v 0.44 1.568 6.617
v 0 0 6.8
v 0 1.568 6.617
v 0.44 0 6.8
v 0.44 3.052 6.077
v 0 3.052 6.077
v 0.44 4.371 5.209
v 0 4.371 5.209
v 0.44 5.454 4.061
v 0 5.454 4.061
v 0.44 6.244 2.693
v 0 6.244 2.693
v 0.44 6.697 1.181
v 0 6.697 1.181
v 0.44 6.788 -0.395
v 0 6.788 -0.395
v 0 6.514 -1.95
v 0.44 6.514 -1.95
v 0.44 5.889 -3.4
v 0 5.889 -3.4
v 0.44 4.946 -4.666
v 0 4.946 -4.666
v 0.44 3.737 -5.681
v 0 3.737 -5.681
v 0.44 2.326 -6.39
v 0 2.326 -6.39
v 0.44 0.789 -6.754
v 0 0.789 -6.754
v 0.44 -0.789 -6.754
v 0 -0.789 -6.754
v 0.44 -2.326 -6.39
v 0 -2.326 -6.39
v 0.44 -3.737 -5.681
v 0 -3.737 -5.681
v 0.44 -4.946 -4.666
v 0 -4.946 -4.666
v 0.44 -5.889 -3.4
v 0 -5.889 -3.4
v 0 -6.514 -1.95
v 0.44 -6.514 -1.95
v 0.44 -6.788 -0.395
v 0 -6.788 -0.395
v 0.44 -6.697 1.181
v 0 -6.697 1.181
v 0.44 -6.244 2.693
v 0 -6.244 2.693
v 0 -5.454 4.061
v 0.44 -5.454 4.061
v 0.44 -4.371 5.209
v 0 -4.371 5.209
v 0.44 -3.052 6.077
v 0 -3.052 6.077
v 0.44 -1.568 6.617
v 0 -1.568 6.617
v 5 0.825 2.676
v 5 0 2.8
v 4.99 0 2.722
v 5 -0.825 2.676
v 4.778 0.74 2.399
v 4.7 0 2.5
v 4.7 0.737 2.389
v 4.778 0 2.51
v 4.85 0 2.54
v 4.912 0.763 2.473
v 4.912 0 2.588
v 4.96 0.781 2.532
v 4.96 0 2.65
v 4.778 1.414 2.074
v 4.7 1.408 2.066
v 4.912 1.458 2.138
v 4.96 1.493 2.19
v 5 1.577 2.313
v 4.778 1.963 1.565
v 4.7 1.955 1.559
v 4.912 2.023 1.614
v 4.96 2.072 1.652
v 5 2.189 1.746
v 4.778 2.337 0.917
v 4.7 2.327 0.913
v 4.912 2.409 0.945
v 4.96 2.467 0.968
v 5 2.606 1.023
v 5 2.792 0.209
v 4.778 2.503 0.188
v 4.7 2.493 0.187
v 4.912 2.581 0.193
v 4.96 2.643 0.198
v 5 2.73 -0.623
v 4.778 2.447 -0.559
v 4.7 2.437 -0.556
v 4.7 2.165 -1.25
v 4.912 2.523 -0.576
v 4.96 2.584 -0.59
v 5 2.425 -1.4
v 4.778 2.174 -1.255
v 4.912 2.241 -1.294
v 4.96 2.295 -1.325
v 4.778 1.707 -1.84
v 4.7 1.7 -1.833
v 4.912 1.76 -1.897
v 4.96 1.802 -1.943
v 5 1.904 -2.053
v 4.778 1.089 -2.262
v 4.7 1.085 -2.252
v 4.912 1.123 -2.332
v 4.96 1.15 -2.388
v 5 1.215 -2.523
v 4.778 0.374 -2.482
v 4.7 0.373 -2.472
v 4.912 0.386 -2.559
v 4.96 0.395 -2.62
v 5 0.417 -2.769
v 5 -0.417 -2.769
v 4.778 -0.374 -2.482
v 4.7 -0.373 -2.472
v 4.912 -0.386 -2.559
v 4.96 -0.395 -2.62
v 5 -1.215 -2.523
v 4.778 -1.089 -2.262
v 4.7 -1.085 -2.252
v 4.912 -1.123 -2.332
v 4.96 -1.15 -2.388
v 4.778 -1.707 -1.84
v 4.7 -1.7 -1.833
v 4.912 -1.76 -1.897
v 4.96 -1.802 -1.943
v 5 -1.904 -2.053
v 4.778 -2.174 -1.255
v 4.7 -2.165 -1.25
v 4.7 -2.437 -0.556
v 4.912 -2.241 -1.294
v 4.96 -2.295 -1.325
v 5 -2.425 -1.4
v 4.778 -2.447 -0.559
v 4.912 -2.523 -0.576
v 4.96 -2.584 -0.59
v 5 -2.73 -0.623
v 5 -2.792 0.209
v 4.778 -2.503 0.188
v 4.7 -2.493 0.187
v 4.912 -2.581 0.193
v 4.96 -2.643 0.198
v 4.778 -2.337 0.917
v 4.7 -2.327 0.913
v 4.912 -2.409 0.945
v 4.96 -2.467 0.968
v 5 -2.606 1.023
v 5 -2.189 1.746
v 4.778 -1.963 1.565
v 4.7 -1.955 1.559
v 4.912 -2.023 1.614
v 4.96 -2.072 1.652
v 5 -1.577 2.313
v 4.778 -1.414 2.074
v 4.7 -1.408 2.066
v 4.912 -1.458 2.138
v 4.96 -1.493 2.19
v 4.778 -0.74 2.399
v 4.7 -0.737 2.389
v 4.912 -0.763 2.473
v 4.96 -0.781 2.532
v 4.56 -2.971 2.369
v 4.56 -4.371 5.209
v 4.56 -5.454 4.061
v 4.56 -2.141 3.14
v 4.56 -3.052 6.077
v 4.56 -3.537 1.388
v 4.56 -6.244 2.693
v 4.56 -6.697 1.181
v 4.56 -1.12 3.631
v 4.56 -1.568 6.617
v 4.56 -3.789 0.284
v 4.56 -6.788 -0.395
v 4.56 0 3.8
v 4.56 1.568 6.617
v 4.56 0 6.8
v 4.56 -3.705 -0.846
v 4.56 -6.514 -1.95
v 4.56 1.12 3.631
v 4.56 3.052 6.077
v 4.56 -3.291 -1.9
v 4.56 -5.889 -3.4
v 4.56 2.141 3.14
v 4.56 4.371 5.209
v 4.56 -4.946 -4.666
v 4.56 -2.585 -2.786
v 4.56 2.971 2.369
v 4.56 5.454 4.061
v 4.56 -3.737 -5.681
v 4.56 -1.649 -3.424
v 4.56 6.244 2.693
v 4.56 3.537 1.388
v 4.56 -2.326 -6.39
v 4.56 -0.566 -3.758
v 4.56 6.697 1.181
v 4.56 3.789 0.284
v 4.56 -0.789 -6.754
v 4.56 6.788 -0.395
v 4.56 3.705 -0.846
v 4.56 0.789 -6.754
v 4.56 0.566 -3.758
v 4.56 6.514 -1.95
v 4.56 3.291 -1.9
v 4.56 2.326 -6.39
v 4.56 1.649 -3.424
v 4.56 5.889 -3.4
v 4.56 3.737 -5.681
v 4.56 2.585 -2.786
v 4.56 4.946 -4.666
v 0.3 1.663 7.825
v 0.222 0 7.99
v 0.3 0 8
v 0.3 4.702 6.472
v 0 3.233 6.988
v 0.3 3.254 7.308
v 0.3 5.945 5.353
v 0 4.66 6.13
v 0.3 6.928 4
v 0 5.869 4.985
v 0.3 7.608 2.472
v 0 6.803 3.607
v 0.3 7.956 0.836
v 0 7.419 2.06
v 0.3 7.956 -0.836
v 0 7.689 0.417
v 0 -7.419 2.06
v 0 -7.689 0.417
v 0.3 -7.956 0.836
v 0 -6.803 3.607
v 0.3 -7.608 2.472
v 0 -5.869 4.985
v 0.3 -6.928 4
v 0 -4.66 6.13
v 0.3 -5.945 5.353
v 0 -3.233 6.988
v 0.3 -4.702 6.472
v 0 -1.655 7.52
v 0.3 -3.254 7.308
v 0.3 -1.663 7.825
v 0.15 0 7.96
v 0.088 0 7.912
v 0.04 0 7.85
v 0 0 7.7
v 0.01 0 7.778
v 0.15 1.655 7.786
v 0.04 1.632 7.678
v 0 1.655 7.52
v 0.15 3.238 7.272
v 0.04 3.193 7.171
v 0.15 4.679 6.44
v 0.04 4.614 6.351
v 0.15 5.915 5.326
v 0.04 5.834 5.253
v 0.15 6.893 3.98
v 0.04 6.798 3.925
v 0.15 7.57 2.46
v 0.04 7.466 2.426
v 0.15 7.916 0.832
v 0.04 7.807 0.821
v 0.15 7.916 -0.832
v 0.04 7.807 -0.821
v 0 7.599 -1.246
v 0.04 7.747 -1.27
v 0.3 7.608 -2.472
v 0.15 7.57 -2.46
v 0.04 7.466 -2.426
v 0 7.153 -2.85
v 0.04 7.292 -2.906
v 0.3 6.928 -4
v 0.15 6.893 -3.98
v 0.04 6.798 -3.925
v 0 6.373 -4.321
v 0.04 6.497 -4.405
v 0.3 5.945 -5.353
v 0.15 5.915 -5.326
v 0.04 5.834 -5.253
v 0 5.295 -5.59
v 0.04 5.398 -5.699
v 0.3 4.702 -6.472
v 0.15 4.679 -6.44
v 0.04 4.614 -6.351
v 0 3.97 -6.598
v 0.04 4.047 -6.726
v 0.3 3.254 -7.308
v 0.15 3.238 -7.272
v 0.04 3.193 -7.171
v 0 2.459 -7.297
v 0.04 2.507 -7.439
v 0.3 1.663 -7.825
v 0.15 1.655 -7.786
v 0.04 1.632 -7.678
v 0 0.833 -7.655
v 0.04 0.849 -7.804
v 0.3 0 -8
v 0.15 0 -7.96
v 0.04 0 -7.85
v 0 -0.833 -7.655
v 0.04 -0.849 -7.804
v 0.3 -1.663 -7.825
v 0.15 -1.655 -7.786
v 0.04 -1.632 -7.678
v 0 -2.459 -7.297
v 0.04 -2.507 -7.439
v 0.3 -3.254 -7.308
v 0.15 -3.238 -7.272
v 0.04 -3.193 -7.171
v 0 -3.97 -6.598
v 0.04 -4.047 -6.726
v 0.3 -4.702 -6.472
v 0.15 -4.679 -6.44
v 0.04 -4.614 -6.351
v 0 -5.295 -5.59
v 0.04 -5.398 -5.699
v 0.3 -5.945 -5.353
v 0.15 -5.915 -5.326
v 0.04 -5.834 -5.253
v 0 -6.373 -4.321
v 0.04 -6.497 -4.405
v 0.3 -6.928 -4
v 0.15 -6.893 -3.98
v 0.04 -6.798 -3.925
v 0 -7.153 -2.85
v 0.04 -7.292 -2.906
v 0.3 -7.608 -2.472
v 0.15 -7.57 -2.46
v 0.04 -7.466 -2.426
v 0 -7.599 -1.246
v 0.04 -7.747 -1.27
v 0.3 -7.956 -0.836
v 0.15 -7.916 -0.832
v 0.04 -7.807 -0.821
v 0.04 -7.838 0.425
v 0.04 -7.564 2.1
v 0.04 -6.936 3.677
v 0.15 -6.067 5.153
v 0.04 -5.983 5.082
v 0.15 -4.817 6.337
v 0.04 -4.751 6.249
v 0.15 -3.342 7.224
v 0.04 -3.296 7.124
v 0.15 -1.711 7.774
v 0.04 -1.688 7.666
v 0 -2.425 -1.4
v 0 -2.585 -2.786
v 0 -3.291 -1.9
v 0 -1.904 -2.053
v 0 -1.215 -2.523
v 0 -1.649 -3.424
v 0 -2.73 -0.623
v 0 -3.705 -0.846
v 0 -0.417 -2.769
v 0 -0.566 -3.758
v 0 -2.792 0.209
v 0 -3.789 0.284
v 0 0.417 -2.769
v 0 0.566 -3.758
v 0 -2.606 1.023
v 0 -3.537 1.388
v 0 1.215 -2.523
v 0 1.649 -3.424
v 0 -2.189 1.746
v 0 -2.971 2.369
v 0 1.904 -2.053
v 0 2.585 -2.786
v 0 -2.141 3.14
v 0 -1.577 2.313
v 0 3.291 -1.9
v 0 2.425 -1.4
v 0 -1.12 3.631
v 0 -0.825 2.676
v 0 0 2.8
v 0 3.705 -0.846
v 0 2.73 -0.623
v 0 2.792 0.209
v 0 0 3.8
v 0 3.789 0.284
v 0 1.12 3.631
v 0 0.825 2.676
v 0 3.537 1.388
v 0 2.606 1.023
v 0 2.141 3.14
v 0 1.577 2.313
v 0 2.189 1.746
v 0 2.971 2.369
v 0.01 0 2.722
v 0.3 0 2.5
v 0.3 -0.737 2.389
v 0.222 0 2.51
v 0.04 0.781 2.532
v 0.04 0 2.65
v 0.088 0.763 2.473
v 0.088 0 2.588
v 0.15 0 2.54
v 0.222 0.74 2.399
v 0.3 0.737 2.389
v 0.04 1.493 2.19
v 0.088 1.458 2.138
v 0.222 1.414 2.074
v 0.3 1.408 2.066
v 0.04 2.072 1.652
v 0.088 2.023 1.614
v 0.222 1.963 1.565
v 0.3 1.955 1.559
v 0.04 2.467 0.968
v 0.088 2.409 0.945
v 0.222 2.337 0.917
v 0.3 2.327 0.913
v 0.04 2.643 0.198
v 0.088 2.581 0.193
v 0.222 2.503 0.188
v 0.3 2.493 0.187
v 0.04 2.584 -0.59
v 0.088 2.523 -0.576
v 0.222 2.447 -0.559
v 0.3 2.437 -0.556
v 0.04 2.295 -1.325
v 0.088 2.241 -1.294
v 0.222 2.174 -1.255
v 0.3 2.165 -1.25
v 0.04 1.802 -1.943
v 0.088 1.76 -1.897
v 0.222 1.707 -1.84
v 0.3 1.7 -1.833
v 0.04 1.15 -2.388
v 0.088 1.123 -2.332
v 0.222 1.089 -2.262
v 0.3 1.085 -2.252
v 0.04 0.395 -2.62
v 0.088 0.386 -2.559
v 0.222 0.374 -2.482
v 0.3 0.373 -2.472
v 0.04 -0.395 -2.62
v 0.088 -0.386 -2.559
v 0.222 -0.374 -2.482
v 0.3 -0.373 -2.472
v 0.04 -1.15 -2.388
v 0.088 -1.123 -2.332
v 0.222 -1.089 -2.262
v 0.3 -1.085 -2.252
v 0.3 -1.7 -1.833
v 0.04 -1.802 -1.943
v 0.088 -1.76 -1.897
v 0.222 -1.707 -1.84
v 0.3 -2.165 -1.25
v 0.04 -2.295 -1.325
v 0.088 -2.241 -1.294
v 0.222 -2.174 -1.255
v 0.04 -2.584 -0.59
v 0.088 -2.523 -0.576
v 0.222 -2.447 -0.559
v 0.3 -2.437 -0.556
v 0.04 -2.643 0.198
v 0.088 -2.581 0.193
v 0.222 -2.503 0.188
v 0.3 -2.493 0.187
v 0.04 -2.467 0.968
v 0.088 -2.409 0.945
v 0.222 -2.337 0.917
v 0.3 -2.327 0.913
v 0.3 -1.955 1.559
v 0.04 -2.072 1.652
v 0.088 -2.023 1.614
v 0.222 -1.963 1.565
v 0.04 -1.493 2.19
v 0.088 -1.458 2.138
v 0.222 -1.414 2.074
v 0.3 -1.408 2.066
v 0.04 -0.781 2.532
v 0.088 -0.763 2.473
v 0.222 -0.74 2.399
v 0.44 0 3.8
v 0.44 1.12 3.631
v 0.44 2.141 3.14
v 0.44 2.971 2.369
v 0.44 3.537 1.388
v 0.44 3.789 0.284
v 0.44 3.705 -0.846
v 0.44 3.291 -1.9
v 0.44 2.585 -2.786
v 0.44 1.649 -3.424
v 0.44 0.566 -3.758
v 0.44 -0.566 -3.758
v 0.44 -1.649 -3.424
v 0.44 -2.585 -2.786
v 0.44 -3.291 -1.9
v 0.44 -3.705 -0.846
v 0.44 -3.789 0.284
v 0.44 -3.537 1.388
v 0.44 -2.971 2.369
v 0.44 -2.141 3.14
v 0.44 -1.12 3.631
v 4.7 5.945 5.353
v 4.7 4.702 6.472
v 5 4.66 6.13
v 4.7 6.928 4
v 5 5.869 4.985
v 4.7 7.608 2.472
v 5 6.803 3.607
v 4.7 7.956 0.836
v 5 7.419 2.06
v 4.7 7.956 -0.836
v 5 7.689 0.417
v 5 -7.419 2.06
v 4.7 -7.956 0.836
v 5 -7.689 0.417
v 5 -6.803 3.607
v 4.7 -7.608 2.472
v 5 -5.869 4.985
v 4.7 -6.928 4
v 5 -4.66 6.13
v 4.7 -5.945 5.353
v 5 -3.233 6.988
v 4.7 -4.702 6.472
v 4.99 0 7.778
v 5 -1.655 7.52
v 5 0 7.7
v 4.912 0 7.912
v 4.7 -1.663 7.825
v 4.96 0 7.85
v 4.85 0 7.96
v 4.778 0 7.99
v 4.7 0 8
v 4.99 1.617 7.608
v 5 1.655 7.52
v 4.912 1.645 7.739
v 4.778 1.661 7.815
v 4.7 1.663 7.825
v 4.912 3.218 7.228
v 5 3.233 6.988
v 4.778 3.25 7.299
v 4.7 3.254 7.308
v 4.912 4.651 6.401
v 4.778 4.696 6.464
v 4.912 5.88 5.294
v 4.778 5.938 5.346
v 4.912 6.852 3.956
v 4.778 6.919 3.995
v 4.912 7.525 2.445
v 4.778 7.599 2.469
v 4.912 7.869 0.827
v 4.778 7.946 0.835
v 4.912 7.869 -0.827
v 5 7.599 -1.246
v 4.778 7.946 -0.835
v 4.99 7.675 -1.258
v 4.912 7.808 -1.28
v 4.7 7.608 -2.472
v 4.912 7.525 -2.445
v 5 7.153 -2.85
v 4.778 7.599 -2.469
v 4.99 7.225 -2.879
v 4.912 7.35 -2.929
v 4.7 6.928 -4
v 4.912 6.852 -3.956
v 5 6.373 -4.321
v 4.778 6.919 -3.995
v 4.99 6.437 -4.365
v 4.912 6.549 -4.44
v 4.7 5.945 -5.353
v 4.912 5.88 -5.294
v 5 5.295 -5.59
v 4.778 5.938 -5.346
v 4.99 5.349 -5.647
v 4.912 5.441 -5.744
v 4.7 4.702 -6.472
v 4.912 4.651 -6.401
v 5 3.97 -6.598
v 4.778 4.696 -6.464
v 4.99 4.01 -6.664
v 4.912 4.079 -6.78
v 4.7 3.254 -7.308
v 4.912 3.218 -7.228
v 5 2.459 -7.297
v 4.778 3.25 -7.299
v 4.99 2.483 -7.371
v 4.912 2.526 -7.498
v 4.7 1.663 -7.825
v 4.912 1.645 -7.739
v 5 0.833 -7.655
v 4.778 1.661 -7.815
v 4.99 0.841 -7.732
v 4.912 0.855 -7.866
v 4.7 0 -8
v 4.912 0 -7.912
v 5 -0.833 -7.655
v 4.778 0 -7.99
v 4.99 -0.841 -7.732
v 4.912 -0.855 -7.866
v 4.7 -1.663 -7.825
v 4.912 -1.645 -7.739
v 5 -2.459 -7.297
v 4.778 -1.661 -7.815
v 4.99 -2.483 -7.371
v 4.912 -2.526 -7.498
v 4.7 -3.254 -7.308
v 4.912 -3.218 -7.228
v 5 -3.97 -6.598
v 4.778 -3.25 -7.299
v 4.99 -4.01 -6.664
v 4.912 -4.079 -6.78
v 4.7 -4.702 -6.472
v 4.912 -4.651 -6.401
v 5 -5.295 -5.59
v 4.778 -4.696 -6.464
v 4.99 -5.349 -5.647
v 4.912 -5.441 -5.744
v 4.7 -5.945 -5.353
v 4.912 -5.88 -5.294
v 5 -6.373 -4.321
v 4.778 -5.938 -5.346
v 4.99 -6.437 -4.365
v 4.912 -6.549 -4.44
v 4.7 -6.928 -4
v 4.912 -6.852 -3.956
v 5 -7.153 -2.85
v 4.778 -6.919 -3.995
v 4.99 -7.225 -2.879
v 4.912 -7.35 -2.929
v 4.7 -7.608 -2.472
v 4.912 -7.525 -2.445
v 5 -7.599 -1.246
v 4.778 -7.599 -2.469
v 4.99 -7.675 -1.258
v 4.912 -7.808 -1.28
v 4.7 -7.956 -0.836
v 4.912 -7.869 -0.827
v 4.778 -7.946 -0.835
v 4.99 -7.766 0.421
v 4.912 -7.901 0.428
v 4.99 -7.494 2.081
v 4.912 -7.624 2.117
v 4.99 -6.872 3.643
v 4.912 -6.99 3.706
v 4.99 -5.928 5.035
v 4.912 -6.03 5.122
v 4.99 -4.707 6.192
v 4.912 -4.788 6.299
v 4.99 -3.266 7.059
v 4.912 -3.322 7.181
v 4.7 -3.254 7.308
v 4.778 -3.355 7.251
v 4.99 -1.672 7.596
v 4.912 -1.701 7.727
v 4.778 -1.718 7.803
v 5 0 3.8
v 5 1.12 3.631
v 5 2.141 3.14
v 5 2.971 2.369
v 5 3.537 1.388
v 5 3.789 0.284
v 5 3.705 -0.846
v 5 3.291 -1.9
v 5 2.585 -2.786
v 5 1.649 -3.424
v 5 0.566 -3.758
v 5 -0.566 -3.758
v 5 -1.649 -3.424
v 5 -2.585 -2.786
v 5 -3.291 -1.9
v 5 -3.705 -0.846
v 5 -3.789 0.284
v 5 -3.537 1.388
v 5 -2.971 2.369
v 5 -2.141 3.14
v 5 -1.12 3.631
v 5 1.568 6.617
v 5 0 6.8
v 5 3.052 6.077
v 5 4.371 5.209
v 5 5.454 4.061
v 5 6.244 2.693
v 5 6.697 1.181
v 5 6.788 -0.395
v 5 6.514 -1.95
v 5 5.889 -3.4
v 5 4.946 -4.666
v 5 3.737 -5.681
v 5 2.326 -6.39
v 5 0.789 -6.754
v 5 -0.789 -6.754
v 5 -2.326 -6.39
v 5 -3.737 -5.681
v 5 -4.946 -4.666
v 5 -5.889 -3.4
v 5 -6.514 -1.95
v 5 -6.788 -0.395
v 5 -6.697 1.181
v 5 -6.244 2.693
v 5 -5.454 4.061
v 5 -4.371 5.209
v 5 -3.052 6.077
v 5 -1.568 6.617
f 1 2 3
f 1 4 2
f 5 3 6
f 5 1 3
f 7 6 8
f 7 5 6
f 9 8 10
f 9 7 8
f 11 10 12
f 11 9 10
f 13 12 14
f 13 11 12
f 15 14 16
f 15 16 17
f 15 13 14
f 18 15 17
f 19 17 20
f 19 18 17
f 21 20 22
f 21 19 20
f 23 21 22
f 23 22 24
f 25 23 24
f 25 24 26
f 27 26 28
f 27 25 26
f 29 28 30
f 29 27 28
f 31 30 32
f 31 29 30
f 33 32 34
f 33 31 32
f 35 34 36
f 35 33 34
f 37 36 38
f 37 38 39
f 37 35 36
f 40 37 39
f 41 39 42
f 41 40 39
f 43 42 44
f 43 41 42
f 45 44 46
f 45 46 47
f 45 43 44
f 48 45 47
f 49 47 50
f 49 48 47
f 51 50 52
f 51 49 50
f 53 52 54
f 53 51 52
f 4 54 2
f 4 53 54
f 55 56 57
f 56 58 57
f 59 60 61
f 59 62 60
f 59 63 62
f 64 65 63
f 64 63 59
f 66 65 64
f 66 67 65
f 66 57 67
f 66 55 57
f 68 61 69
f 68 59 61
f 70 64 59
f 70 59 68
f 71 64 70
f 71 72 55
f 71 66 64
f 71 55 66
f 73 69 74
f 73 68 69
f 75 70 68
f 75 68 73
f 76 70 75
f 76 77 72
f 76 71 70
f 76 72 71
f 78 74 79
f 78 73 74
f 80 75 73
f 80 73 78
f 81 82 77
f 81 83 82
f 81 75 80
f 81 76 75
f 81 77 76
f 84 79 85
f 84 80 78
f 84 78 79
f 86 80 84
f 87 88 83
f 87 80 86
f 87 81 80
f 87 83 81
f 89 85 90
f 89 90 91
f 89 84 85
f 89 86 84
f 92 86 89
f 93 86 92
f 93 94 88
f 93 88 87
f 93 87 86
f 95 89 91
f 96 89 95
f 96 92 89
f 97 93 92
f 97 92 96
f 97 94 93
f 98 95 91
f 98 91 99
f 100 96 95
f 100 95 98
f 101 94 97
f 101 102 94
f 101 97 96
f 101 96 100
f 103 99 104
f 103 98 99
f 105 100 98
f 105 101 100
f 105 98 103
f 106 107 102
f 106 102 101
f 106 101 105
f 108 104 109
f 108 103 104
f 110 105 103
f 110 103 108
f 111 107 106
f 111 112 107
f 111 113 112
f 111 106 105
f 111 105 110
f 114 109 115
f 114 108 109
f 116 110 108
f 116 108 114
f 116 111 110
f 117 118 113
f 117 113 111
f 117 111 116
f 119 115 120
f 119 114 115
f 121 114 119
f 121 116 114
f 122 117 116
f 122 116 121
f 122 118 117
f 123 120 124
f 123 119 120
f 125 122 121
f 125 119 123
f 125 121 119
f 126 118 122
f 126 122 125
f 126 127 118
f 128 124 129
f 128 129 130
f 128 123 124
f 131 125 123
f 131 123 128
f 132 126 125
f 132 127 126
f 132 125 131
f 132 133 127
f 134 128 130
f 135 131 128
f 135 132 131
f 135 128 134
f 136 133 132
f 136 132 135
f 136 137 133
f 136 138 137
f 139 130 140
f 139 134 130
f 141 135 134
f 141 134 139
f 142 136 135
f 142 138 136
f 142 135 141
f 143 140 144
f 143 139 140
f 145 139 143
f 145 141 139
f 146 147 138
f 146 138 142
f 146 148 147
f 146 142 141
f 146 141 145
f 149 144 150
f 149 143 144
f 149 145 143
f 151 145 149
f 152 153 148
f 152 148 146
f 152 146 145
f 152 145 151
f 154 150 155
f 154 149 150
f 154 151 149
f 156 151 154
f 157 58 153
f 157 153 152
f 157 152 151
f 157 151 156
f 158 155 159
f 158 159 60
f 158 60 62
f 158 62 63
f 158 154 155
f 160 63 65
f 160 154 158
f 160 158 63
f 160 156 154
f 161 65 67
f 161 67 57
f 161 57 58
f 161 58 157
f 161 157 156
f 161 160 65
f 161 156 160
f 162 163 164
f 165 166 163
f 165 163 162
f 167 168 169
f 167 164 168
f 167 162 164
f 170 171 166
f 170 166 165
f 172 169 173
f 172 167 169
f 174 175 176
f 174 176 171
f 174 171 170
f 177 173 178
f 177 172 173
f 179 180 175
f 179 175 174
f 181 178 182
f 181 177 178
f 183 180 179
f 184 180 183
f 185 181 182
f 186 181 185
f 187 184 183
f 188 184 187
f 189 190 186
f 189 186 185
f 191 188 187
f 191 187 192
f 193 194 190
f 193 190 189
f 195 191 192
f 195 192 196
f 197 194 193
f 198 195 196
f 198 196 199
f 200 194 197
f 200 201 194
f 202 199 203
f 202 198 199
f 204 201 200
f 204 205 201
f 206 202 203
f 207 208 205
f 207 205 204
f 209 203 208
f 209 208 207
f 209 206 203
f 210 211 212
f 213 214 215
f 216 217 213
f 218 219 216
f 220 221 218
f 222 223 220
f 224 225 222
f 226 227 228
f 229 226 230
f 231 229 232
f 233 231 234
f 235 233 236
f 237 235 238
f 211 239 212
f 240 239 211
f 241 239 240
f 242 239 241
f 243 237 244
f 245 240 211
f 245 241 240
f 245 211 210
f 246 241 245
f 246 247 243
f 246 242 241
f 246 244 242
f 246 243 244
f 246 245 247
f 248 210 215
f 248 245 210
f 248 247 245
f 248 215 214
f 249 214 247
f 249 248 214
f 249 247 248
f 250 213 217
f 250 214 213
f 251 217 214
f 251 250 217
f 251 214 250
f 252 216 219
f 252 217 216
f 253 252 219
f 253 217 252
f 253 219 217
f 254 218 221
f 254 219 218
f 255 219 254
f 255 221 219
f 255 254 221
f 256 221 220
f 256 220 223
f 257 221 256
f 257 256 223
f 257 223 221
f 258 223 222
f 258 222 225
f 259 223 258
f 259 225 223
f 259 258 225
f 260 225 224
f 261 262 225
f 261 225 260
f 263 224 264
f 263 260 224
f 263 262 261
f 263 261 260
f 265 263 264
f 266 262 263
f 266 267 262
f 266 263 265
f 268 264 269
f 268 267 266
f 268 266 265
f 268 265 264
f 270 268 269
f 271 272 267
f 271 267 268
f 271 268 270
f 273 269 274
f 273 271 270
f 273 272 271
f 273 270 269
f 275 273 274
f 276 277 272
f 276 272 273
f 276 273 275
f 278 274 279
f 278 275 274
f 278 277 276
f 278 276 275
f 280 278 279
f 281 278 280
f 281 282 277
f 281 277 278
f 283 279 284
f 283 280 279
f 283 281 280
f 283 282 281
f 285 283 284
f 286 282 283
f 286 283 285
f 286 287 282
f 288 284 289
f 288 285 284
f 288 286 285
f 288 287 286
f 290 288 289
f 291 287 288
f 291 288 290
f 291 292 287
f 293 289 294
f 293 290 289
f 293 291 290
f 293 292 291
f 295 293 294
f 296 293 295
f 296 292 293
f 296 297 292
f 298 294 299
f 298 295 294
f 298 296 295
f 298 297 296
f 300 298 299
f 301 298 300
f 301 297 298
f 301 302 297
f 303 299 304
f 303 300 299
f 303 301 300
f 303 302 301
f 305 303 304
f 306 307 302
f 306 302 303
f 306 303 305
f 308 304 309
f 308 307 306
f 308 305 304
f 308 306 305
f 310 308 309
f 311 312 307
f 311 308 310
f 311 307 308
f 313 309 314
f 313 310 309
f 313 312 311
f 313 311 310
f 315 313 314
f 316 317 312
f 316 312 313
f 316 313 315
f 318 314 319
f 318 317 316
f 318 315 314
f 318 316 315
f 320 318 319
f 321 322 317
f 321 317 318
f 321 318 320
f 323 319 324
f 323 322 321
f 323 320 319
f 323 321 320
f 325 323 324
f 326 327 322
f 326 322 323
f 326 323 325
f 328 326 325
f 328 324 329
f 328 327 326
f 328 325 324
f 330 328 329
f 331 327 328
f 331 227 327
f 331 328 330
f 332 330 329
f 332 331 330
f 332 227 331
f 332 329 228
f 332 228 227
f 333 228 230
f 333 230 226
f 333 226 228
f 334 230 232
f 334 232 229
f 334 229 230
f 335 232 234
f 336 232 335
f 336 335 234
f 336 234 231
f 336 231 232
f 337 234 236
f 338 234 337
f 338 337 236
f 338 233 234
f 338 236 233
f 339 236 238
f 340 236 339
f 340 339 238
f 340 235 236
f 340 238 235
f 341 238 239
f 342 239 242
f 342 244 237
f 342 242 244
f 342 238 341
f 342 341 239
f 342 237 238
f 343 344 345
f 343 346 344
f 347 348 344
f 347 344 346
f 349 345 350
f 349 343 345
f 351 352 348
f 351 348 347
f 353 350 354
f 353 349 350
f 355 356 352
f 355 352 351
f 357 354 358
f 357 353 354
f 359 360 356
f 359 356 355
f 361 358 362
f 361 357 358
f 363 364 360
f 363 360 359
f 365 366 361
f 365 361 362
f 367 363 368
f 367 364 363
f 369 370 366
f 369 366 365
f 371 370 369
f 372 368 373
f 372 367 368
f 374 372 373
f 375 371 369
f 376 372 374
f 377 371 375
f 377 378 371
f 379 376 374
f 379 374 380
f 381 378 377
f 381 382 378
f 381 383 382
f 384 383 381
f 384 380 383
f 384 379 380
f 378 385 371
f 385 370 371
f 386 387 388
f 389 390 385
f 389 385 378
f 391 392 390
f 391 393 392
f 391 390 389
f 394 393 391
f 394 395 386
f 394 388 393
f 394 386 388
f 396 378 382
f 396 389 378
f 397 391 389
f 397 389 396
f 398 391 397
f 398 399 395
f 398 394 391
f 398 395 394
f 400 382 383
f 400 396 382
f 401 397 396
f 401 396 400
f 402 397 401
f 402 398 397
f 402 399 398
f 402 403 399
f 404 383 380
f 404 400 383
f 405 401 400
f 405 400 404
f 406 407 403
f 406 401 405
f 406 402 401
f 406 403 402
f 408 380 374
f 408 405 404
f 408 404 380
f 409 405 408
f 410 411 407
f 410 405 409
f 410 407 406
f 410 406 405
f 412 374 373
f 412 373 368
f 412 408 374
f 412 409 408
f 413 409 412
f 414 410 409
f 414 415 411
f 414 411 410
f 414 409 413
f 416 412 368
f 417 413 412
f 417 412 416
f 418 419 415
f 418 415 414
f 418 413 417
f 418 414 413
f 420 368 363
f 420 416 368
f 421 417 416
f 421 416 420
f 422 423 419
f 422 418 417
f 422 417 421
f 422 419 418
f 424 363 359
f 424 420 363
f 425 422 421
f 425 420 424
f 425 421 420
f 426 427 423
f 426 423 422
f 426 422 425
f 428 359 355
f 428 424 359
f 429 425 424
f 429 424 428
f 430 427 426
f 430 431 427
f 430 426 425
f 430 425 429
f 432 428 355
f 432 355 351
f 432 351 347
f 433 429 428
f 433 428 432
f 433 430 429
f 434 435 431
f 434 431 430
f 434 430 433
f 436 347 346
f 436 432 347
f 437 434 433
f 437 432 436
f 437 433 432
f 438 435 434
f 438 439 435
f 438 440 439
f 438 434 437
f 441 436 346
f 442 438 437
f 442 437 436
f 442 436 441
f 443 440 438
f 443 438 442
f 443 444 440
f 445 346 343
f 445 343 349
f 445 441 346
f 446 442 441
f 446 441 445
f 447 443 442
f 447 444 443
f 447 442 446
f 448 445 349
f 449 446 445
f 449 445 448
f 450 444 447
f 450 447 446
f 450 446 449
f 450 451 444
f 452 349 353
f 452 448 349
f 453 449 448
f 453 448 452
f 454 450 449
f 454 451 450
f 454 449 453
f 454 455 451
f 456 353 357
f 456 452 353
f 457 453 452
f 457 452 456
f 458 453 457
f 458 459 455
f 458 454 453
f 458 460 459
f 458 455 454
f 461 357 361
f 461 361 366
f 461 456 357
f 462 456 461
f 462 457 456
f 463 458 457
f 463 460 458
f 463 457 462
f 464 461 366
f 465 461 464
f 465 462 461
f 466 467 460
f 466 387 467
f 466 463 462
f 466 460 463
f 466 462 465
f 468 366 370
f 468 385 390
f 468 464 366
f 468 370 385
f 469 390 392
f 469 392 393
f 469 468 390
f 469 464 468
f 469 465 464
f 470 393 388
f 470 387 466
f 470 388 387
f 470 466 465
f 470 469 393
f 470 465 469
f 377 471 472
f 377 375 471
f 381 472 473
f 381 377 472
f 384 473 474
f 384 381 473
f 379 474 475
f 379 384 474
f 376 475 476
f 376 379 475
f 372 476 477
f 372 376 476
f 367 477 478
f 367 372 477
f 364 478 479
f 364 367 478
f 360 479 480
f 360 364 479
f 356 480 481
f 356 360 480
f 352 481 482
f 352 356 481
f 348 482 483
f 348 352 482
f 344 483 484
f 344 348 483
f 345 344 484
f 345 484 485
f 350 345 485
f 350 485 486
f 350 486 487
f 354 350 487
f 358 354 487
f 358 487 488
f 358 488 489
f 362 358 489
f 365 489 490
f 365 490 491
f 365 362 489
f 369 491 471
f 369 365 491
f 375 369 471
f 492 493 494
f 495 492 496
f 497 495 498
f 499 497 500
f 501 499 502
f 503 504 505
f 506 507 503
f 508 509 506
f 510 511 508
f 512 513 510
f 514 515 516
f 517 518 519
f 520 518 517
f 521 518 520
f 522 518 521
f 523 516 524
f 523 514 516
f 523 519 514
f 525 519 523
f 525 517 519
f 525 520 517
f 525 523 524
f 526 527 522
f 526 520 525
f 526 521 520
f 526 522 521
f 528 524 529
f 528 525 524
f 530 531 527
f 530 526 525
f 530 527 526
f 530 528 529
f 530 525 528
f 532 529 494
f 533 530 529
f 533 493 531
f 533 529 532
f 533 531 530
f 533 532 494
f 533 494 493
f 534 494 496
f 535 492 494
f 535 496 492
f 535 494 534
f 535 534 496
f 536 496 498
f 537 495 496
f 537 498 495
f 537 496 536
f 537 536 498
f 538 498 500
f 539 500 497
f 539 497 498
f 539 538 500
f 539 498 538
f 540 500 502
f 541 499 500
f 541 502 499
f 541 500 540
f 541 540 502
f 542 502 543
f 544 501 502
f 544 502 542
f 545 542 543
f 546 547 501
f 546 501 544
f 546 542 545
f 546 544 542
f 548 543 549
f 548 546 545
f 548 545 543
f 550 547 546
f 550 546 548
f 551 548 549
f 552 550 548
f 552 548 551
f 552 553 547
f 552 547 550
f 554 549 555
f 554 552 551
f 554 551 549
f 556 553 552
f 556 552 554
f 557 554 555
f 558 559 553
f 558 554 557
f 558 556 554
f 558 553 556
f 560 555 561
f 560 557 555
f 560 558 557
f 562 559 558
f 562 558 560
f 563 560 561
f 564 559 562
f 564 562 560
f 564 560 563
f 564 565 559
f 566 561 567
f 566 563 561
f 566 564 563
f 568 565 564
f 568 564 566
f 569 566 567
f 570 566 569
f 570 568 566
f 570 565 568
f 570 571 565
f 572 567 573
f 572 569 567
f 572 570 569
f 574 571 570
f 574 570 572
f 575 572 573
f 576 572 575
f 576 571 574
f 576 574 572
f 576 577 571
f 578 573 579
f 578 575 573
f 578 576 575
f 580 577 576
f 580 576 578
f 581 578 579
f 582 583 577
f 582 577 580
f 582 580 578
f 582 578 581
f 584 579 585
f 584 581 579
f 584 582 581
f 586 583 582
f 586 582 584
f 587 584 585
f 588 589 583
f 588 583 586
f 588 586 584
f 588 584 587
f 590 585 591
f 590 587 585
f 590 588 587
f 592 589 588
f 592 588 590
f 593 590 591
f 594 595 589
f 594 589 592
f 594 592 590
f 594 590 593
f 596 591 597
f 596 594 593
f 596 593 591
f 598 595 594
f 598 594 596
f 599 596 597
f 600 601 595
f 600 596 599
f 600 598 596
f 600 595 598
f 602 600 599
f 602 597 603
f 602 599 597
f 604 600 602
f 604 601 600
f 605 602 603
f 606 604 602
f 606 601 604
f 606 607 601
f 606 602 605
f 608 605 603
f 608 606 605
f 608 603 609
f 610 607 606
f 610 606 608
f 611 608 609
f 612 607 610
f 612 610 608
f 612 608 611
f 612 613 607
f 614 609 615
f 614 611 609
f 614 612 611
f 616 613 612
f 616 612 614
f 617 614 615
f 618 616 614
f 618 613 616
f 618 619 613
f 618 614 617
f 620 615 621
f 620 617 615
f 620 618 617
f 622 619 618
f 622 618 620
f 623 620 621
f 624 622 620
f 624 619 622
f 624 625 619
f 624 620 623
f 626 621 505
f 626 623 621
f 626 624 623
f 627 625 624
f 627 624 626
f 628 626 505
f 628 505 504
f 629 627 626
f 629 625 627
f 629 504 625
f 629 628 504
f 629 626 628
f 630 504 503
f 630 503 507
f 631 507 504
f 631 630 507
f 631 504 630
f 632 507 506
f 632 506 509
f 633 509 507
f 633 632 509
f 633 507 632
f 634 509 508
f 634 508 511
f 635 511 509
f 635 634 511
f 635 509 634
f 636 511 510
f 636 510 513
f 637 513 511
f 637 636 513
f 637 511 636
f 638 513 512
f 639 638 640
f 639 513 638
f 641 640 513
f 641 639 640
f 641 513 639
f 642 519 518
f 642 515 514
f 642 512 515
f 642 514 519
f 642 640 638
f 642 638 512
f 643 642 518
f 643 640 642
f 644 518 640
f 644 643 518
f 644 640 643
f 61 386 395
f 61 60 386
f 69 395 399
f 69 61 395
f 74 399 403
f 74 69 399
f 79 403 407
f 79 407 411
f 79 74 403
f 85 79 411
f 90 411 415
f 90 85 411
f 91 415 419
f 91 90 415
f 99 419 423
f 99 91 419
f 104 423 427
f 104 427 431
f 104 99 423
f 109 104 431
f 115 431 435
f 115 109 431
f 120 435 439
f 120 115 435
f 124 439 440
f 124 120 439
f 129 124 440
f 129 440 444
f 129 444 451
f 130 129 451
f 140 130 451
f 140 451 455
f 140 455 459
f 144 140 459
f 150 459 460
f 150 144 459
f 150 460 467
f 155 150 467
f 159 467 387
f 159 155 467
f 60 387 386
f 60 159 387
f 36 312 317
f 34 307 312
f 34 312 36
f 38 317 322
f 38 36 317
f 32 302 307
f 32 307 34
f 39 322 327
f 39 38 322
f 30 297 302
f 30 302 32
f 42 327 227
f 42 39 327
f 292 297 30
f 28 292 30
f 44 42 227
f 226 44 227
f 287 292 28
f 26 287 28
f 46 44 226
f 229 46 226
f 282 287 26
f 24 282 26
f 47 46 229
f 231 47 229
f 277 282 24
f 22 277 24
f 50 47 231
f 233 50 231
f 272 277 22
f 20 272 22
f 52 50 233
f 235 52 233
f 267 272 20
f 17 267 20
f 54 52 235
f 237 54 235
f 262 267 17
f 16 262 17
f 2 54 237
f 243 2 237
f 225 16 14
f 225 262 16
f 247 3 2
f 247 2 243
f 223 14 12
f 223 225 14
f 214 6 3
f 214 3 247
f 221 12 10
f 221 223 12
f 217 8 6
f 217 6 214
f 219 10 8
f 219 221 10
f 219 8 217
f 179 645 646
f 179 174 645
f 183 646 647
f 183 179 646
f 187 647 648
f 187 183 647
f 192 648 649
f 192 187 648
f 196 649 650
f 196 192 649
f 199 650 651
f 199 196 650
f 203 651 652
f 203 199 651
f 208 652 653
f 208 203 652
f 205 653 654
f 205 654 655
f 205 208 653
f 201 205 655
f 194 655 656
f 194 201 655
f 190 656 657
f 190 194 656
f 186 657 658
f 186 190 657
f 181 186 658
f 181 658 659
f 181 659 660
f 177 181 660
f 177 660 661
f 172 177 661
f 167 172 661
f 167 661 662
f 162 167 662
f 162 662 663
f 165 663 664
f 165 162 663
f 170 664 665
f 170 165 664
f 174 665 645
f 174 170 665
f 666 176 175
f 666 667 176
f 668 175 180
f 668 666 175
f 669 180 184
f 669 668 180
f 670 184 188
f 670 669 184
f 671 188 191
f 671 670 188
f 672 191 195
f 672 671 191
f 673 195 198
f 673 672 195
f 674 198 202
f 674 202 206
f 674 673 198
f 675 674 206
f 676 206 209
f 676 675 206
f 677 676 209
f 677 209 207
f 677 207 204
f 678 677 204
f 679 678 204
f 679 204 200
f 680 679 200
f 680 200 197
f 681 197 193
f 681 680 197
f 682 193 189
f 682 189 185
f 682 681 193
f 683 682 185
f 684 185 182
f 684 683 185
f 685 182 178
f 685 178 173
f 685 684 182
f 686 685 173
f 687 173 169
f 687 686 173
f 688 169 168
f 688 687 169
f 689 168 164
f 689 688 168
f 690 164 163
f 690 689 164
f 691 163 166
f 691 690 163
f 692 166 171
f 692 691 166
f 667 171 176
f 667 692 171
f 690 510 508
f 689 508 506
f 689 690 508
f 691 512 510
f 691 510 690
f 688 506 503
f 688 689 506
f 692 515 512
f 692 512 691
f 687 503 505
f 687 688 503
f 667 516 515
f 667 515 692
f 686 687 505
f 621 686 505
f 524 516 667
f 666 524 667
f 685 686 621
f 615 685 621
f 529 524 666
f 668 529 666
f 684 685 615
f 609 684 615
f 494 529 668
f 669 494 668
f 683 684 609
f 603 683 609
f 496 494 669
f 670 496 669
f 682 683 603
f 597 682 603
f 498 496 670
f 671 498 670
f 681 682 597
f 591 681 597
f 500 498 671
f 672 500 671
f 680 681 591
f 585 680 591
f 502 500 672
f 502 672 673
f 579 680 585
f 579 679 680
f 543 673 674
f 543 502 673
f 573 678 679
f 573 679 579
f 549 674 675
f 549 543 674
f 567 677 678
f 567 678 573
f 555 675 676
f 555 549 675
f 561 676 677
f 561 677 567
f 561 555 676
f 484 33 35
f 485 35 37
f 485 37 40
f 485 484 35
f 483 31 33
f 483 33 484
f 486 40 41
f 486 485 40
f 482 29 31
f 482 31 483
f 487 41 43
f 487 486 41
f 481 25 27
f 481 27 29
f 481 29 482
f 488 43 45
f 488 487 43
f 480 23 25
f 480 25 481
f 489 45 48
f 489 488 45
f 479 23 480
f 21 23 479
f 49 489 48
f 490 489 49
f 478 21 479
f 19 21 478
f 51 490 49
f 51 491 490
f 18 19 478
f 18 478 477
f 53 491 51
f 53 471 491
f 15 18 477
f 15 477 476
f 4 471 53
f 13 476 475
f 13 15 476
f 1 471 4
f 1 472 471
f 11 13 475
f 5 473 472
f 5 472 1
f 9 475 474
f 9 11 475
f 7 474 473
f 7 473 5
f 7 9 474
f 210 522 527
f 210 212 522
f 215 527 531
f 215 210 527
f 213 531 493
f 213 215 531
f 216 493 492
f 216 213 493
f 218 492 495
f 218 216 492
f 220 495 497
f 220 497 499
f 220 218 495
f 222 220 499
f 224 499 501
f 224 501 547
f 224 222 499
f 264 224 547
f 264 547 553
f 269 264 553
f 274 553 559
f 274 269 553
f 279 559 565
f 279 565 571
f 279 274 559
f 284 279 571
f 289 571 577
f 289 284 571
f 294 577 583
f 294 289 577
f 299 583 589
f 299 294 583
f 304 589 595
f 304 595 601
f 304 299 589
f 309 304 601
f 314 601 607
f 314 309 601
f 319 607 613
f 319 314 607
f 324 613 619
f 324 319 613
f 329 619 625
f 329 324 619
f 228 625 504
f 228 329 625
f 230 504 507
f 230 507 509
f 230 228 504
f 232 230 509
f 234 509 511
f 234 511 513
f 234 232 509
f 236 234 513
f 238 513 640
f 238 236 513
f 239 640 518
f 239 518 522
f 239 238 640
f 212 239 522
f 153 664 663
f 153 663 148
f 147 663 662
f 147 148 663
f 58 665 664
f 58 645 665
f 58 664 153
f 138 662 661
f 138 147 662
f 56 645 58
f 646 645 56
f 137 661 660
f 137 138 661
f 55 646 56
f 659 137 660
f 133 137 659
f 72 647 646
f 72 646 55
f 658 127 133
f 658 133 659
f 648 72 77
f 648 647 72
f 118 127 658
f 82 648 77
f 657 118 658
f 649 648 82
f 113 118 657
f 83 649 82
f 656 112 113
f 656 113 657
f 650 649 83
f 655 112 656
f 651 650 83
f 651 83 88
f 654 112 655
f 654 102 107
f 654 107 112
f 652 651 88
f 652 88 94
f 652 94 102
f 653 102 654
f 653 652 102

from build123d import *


with BuildPart() as part:
    # Sketch1 → Revolve1 (revolve)
    with BuildSketch(Plane.XY, mode=Mode.PRIVATE) as revolve1_sk:
        with BuildLine():
            Line((0, 7.7), (0, 6.8))
            Line((0, 6.8), (0.44, 6.8))
            Line((0.44, 6.8), (0.44, 3.8))
            Line((0.44, 3.8), (0, 3.8))
            Line((0, 3.8), (0, 2.8))
            ThreePointArc((0, 2.8), (0.087867966, 2.587867966), (0.3, 2.5))
            Line((0.3, 2.5), (4.7, 2.5))
            ThreePointArc((4.7, 2.5), (4.912132034, 2.587867966), (5, 2.8))
            Line((5, 2.8), (5, 3.8))
            Line((5, 3.8), (4.56, 3.8))
            Line((4.56, 3.8), (4.56, 6.8))
            Line((4.56, 6.8), (5, 6.8))
            Line((5, 6.8), (5, 7.7))
            ThreePointArc((5, 7.7), (4.912132034, 7.912132034), (4.7, 8))
            Line((4.7, 8), (0.3, 8))
            ThreePointArc((0.3, 8), (0.087867966, 7.912132034), (0, 7.7))
        make_face()
    revolve(revolve1_sk.sketch.rotate(Axis((4.7, 0, 0), (-1, 0, 0)), 270), axis=Axis((4.7, 0, 0), (-1, 0, 0)))


solid = part.part
